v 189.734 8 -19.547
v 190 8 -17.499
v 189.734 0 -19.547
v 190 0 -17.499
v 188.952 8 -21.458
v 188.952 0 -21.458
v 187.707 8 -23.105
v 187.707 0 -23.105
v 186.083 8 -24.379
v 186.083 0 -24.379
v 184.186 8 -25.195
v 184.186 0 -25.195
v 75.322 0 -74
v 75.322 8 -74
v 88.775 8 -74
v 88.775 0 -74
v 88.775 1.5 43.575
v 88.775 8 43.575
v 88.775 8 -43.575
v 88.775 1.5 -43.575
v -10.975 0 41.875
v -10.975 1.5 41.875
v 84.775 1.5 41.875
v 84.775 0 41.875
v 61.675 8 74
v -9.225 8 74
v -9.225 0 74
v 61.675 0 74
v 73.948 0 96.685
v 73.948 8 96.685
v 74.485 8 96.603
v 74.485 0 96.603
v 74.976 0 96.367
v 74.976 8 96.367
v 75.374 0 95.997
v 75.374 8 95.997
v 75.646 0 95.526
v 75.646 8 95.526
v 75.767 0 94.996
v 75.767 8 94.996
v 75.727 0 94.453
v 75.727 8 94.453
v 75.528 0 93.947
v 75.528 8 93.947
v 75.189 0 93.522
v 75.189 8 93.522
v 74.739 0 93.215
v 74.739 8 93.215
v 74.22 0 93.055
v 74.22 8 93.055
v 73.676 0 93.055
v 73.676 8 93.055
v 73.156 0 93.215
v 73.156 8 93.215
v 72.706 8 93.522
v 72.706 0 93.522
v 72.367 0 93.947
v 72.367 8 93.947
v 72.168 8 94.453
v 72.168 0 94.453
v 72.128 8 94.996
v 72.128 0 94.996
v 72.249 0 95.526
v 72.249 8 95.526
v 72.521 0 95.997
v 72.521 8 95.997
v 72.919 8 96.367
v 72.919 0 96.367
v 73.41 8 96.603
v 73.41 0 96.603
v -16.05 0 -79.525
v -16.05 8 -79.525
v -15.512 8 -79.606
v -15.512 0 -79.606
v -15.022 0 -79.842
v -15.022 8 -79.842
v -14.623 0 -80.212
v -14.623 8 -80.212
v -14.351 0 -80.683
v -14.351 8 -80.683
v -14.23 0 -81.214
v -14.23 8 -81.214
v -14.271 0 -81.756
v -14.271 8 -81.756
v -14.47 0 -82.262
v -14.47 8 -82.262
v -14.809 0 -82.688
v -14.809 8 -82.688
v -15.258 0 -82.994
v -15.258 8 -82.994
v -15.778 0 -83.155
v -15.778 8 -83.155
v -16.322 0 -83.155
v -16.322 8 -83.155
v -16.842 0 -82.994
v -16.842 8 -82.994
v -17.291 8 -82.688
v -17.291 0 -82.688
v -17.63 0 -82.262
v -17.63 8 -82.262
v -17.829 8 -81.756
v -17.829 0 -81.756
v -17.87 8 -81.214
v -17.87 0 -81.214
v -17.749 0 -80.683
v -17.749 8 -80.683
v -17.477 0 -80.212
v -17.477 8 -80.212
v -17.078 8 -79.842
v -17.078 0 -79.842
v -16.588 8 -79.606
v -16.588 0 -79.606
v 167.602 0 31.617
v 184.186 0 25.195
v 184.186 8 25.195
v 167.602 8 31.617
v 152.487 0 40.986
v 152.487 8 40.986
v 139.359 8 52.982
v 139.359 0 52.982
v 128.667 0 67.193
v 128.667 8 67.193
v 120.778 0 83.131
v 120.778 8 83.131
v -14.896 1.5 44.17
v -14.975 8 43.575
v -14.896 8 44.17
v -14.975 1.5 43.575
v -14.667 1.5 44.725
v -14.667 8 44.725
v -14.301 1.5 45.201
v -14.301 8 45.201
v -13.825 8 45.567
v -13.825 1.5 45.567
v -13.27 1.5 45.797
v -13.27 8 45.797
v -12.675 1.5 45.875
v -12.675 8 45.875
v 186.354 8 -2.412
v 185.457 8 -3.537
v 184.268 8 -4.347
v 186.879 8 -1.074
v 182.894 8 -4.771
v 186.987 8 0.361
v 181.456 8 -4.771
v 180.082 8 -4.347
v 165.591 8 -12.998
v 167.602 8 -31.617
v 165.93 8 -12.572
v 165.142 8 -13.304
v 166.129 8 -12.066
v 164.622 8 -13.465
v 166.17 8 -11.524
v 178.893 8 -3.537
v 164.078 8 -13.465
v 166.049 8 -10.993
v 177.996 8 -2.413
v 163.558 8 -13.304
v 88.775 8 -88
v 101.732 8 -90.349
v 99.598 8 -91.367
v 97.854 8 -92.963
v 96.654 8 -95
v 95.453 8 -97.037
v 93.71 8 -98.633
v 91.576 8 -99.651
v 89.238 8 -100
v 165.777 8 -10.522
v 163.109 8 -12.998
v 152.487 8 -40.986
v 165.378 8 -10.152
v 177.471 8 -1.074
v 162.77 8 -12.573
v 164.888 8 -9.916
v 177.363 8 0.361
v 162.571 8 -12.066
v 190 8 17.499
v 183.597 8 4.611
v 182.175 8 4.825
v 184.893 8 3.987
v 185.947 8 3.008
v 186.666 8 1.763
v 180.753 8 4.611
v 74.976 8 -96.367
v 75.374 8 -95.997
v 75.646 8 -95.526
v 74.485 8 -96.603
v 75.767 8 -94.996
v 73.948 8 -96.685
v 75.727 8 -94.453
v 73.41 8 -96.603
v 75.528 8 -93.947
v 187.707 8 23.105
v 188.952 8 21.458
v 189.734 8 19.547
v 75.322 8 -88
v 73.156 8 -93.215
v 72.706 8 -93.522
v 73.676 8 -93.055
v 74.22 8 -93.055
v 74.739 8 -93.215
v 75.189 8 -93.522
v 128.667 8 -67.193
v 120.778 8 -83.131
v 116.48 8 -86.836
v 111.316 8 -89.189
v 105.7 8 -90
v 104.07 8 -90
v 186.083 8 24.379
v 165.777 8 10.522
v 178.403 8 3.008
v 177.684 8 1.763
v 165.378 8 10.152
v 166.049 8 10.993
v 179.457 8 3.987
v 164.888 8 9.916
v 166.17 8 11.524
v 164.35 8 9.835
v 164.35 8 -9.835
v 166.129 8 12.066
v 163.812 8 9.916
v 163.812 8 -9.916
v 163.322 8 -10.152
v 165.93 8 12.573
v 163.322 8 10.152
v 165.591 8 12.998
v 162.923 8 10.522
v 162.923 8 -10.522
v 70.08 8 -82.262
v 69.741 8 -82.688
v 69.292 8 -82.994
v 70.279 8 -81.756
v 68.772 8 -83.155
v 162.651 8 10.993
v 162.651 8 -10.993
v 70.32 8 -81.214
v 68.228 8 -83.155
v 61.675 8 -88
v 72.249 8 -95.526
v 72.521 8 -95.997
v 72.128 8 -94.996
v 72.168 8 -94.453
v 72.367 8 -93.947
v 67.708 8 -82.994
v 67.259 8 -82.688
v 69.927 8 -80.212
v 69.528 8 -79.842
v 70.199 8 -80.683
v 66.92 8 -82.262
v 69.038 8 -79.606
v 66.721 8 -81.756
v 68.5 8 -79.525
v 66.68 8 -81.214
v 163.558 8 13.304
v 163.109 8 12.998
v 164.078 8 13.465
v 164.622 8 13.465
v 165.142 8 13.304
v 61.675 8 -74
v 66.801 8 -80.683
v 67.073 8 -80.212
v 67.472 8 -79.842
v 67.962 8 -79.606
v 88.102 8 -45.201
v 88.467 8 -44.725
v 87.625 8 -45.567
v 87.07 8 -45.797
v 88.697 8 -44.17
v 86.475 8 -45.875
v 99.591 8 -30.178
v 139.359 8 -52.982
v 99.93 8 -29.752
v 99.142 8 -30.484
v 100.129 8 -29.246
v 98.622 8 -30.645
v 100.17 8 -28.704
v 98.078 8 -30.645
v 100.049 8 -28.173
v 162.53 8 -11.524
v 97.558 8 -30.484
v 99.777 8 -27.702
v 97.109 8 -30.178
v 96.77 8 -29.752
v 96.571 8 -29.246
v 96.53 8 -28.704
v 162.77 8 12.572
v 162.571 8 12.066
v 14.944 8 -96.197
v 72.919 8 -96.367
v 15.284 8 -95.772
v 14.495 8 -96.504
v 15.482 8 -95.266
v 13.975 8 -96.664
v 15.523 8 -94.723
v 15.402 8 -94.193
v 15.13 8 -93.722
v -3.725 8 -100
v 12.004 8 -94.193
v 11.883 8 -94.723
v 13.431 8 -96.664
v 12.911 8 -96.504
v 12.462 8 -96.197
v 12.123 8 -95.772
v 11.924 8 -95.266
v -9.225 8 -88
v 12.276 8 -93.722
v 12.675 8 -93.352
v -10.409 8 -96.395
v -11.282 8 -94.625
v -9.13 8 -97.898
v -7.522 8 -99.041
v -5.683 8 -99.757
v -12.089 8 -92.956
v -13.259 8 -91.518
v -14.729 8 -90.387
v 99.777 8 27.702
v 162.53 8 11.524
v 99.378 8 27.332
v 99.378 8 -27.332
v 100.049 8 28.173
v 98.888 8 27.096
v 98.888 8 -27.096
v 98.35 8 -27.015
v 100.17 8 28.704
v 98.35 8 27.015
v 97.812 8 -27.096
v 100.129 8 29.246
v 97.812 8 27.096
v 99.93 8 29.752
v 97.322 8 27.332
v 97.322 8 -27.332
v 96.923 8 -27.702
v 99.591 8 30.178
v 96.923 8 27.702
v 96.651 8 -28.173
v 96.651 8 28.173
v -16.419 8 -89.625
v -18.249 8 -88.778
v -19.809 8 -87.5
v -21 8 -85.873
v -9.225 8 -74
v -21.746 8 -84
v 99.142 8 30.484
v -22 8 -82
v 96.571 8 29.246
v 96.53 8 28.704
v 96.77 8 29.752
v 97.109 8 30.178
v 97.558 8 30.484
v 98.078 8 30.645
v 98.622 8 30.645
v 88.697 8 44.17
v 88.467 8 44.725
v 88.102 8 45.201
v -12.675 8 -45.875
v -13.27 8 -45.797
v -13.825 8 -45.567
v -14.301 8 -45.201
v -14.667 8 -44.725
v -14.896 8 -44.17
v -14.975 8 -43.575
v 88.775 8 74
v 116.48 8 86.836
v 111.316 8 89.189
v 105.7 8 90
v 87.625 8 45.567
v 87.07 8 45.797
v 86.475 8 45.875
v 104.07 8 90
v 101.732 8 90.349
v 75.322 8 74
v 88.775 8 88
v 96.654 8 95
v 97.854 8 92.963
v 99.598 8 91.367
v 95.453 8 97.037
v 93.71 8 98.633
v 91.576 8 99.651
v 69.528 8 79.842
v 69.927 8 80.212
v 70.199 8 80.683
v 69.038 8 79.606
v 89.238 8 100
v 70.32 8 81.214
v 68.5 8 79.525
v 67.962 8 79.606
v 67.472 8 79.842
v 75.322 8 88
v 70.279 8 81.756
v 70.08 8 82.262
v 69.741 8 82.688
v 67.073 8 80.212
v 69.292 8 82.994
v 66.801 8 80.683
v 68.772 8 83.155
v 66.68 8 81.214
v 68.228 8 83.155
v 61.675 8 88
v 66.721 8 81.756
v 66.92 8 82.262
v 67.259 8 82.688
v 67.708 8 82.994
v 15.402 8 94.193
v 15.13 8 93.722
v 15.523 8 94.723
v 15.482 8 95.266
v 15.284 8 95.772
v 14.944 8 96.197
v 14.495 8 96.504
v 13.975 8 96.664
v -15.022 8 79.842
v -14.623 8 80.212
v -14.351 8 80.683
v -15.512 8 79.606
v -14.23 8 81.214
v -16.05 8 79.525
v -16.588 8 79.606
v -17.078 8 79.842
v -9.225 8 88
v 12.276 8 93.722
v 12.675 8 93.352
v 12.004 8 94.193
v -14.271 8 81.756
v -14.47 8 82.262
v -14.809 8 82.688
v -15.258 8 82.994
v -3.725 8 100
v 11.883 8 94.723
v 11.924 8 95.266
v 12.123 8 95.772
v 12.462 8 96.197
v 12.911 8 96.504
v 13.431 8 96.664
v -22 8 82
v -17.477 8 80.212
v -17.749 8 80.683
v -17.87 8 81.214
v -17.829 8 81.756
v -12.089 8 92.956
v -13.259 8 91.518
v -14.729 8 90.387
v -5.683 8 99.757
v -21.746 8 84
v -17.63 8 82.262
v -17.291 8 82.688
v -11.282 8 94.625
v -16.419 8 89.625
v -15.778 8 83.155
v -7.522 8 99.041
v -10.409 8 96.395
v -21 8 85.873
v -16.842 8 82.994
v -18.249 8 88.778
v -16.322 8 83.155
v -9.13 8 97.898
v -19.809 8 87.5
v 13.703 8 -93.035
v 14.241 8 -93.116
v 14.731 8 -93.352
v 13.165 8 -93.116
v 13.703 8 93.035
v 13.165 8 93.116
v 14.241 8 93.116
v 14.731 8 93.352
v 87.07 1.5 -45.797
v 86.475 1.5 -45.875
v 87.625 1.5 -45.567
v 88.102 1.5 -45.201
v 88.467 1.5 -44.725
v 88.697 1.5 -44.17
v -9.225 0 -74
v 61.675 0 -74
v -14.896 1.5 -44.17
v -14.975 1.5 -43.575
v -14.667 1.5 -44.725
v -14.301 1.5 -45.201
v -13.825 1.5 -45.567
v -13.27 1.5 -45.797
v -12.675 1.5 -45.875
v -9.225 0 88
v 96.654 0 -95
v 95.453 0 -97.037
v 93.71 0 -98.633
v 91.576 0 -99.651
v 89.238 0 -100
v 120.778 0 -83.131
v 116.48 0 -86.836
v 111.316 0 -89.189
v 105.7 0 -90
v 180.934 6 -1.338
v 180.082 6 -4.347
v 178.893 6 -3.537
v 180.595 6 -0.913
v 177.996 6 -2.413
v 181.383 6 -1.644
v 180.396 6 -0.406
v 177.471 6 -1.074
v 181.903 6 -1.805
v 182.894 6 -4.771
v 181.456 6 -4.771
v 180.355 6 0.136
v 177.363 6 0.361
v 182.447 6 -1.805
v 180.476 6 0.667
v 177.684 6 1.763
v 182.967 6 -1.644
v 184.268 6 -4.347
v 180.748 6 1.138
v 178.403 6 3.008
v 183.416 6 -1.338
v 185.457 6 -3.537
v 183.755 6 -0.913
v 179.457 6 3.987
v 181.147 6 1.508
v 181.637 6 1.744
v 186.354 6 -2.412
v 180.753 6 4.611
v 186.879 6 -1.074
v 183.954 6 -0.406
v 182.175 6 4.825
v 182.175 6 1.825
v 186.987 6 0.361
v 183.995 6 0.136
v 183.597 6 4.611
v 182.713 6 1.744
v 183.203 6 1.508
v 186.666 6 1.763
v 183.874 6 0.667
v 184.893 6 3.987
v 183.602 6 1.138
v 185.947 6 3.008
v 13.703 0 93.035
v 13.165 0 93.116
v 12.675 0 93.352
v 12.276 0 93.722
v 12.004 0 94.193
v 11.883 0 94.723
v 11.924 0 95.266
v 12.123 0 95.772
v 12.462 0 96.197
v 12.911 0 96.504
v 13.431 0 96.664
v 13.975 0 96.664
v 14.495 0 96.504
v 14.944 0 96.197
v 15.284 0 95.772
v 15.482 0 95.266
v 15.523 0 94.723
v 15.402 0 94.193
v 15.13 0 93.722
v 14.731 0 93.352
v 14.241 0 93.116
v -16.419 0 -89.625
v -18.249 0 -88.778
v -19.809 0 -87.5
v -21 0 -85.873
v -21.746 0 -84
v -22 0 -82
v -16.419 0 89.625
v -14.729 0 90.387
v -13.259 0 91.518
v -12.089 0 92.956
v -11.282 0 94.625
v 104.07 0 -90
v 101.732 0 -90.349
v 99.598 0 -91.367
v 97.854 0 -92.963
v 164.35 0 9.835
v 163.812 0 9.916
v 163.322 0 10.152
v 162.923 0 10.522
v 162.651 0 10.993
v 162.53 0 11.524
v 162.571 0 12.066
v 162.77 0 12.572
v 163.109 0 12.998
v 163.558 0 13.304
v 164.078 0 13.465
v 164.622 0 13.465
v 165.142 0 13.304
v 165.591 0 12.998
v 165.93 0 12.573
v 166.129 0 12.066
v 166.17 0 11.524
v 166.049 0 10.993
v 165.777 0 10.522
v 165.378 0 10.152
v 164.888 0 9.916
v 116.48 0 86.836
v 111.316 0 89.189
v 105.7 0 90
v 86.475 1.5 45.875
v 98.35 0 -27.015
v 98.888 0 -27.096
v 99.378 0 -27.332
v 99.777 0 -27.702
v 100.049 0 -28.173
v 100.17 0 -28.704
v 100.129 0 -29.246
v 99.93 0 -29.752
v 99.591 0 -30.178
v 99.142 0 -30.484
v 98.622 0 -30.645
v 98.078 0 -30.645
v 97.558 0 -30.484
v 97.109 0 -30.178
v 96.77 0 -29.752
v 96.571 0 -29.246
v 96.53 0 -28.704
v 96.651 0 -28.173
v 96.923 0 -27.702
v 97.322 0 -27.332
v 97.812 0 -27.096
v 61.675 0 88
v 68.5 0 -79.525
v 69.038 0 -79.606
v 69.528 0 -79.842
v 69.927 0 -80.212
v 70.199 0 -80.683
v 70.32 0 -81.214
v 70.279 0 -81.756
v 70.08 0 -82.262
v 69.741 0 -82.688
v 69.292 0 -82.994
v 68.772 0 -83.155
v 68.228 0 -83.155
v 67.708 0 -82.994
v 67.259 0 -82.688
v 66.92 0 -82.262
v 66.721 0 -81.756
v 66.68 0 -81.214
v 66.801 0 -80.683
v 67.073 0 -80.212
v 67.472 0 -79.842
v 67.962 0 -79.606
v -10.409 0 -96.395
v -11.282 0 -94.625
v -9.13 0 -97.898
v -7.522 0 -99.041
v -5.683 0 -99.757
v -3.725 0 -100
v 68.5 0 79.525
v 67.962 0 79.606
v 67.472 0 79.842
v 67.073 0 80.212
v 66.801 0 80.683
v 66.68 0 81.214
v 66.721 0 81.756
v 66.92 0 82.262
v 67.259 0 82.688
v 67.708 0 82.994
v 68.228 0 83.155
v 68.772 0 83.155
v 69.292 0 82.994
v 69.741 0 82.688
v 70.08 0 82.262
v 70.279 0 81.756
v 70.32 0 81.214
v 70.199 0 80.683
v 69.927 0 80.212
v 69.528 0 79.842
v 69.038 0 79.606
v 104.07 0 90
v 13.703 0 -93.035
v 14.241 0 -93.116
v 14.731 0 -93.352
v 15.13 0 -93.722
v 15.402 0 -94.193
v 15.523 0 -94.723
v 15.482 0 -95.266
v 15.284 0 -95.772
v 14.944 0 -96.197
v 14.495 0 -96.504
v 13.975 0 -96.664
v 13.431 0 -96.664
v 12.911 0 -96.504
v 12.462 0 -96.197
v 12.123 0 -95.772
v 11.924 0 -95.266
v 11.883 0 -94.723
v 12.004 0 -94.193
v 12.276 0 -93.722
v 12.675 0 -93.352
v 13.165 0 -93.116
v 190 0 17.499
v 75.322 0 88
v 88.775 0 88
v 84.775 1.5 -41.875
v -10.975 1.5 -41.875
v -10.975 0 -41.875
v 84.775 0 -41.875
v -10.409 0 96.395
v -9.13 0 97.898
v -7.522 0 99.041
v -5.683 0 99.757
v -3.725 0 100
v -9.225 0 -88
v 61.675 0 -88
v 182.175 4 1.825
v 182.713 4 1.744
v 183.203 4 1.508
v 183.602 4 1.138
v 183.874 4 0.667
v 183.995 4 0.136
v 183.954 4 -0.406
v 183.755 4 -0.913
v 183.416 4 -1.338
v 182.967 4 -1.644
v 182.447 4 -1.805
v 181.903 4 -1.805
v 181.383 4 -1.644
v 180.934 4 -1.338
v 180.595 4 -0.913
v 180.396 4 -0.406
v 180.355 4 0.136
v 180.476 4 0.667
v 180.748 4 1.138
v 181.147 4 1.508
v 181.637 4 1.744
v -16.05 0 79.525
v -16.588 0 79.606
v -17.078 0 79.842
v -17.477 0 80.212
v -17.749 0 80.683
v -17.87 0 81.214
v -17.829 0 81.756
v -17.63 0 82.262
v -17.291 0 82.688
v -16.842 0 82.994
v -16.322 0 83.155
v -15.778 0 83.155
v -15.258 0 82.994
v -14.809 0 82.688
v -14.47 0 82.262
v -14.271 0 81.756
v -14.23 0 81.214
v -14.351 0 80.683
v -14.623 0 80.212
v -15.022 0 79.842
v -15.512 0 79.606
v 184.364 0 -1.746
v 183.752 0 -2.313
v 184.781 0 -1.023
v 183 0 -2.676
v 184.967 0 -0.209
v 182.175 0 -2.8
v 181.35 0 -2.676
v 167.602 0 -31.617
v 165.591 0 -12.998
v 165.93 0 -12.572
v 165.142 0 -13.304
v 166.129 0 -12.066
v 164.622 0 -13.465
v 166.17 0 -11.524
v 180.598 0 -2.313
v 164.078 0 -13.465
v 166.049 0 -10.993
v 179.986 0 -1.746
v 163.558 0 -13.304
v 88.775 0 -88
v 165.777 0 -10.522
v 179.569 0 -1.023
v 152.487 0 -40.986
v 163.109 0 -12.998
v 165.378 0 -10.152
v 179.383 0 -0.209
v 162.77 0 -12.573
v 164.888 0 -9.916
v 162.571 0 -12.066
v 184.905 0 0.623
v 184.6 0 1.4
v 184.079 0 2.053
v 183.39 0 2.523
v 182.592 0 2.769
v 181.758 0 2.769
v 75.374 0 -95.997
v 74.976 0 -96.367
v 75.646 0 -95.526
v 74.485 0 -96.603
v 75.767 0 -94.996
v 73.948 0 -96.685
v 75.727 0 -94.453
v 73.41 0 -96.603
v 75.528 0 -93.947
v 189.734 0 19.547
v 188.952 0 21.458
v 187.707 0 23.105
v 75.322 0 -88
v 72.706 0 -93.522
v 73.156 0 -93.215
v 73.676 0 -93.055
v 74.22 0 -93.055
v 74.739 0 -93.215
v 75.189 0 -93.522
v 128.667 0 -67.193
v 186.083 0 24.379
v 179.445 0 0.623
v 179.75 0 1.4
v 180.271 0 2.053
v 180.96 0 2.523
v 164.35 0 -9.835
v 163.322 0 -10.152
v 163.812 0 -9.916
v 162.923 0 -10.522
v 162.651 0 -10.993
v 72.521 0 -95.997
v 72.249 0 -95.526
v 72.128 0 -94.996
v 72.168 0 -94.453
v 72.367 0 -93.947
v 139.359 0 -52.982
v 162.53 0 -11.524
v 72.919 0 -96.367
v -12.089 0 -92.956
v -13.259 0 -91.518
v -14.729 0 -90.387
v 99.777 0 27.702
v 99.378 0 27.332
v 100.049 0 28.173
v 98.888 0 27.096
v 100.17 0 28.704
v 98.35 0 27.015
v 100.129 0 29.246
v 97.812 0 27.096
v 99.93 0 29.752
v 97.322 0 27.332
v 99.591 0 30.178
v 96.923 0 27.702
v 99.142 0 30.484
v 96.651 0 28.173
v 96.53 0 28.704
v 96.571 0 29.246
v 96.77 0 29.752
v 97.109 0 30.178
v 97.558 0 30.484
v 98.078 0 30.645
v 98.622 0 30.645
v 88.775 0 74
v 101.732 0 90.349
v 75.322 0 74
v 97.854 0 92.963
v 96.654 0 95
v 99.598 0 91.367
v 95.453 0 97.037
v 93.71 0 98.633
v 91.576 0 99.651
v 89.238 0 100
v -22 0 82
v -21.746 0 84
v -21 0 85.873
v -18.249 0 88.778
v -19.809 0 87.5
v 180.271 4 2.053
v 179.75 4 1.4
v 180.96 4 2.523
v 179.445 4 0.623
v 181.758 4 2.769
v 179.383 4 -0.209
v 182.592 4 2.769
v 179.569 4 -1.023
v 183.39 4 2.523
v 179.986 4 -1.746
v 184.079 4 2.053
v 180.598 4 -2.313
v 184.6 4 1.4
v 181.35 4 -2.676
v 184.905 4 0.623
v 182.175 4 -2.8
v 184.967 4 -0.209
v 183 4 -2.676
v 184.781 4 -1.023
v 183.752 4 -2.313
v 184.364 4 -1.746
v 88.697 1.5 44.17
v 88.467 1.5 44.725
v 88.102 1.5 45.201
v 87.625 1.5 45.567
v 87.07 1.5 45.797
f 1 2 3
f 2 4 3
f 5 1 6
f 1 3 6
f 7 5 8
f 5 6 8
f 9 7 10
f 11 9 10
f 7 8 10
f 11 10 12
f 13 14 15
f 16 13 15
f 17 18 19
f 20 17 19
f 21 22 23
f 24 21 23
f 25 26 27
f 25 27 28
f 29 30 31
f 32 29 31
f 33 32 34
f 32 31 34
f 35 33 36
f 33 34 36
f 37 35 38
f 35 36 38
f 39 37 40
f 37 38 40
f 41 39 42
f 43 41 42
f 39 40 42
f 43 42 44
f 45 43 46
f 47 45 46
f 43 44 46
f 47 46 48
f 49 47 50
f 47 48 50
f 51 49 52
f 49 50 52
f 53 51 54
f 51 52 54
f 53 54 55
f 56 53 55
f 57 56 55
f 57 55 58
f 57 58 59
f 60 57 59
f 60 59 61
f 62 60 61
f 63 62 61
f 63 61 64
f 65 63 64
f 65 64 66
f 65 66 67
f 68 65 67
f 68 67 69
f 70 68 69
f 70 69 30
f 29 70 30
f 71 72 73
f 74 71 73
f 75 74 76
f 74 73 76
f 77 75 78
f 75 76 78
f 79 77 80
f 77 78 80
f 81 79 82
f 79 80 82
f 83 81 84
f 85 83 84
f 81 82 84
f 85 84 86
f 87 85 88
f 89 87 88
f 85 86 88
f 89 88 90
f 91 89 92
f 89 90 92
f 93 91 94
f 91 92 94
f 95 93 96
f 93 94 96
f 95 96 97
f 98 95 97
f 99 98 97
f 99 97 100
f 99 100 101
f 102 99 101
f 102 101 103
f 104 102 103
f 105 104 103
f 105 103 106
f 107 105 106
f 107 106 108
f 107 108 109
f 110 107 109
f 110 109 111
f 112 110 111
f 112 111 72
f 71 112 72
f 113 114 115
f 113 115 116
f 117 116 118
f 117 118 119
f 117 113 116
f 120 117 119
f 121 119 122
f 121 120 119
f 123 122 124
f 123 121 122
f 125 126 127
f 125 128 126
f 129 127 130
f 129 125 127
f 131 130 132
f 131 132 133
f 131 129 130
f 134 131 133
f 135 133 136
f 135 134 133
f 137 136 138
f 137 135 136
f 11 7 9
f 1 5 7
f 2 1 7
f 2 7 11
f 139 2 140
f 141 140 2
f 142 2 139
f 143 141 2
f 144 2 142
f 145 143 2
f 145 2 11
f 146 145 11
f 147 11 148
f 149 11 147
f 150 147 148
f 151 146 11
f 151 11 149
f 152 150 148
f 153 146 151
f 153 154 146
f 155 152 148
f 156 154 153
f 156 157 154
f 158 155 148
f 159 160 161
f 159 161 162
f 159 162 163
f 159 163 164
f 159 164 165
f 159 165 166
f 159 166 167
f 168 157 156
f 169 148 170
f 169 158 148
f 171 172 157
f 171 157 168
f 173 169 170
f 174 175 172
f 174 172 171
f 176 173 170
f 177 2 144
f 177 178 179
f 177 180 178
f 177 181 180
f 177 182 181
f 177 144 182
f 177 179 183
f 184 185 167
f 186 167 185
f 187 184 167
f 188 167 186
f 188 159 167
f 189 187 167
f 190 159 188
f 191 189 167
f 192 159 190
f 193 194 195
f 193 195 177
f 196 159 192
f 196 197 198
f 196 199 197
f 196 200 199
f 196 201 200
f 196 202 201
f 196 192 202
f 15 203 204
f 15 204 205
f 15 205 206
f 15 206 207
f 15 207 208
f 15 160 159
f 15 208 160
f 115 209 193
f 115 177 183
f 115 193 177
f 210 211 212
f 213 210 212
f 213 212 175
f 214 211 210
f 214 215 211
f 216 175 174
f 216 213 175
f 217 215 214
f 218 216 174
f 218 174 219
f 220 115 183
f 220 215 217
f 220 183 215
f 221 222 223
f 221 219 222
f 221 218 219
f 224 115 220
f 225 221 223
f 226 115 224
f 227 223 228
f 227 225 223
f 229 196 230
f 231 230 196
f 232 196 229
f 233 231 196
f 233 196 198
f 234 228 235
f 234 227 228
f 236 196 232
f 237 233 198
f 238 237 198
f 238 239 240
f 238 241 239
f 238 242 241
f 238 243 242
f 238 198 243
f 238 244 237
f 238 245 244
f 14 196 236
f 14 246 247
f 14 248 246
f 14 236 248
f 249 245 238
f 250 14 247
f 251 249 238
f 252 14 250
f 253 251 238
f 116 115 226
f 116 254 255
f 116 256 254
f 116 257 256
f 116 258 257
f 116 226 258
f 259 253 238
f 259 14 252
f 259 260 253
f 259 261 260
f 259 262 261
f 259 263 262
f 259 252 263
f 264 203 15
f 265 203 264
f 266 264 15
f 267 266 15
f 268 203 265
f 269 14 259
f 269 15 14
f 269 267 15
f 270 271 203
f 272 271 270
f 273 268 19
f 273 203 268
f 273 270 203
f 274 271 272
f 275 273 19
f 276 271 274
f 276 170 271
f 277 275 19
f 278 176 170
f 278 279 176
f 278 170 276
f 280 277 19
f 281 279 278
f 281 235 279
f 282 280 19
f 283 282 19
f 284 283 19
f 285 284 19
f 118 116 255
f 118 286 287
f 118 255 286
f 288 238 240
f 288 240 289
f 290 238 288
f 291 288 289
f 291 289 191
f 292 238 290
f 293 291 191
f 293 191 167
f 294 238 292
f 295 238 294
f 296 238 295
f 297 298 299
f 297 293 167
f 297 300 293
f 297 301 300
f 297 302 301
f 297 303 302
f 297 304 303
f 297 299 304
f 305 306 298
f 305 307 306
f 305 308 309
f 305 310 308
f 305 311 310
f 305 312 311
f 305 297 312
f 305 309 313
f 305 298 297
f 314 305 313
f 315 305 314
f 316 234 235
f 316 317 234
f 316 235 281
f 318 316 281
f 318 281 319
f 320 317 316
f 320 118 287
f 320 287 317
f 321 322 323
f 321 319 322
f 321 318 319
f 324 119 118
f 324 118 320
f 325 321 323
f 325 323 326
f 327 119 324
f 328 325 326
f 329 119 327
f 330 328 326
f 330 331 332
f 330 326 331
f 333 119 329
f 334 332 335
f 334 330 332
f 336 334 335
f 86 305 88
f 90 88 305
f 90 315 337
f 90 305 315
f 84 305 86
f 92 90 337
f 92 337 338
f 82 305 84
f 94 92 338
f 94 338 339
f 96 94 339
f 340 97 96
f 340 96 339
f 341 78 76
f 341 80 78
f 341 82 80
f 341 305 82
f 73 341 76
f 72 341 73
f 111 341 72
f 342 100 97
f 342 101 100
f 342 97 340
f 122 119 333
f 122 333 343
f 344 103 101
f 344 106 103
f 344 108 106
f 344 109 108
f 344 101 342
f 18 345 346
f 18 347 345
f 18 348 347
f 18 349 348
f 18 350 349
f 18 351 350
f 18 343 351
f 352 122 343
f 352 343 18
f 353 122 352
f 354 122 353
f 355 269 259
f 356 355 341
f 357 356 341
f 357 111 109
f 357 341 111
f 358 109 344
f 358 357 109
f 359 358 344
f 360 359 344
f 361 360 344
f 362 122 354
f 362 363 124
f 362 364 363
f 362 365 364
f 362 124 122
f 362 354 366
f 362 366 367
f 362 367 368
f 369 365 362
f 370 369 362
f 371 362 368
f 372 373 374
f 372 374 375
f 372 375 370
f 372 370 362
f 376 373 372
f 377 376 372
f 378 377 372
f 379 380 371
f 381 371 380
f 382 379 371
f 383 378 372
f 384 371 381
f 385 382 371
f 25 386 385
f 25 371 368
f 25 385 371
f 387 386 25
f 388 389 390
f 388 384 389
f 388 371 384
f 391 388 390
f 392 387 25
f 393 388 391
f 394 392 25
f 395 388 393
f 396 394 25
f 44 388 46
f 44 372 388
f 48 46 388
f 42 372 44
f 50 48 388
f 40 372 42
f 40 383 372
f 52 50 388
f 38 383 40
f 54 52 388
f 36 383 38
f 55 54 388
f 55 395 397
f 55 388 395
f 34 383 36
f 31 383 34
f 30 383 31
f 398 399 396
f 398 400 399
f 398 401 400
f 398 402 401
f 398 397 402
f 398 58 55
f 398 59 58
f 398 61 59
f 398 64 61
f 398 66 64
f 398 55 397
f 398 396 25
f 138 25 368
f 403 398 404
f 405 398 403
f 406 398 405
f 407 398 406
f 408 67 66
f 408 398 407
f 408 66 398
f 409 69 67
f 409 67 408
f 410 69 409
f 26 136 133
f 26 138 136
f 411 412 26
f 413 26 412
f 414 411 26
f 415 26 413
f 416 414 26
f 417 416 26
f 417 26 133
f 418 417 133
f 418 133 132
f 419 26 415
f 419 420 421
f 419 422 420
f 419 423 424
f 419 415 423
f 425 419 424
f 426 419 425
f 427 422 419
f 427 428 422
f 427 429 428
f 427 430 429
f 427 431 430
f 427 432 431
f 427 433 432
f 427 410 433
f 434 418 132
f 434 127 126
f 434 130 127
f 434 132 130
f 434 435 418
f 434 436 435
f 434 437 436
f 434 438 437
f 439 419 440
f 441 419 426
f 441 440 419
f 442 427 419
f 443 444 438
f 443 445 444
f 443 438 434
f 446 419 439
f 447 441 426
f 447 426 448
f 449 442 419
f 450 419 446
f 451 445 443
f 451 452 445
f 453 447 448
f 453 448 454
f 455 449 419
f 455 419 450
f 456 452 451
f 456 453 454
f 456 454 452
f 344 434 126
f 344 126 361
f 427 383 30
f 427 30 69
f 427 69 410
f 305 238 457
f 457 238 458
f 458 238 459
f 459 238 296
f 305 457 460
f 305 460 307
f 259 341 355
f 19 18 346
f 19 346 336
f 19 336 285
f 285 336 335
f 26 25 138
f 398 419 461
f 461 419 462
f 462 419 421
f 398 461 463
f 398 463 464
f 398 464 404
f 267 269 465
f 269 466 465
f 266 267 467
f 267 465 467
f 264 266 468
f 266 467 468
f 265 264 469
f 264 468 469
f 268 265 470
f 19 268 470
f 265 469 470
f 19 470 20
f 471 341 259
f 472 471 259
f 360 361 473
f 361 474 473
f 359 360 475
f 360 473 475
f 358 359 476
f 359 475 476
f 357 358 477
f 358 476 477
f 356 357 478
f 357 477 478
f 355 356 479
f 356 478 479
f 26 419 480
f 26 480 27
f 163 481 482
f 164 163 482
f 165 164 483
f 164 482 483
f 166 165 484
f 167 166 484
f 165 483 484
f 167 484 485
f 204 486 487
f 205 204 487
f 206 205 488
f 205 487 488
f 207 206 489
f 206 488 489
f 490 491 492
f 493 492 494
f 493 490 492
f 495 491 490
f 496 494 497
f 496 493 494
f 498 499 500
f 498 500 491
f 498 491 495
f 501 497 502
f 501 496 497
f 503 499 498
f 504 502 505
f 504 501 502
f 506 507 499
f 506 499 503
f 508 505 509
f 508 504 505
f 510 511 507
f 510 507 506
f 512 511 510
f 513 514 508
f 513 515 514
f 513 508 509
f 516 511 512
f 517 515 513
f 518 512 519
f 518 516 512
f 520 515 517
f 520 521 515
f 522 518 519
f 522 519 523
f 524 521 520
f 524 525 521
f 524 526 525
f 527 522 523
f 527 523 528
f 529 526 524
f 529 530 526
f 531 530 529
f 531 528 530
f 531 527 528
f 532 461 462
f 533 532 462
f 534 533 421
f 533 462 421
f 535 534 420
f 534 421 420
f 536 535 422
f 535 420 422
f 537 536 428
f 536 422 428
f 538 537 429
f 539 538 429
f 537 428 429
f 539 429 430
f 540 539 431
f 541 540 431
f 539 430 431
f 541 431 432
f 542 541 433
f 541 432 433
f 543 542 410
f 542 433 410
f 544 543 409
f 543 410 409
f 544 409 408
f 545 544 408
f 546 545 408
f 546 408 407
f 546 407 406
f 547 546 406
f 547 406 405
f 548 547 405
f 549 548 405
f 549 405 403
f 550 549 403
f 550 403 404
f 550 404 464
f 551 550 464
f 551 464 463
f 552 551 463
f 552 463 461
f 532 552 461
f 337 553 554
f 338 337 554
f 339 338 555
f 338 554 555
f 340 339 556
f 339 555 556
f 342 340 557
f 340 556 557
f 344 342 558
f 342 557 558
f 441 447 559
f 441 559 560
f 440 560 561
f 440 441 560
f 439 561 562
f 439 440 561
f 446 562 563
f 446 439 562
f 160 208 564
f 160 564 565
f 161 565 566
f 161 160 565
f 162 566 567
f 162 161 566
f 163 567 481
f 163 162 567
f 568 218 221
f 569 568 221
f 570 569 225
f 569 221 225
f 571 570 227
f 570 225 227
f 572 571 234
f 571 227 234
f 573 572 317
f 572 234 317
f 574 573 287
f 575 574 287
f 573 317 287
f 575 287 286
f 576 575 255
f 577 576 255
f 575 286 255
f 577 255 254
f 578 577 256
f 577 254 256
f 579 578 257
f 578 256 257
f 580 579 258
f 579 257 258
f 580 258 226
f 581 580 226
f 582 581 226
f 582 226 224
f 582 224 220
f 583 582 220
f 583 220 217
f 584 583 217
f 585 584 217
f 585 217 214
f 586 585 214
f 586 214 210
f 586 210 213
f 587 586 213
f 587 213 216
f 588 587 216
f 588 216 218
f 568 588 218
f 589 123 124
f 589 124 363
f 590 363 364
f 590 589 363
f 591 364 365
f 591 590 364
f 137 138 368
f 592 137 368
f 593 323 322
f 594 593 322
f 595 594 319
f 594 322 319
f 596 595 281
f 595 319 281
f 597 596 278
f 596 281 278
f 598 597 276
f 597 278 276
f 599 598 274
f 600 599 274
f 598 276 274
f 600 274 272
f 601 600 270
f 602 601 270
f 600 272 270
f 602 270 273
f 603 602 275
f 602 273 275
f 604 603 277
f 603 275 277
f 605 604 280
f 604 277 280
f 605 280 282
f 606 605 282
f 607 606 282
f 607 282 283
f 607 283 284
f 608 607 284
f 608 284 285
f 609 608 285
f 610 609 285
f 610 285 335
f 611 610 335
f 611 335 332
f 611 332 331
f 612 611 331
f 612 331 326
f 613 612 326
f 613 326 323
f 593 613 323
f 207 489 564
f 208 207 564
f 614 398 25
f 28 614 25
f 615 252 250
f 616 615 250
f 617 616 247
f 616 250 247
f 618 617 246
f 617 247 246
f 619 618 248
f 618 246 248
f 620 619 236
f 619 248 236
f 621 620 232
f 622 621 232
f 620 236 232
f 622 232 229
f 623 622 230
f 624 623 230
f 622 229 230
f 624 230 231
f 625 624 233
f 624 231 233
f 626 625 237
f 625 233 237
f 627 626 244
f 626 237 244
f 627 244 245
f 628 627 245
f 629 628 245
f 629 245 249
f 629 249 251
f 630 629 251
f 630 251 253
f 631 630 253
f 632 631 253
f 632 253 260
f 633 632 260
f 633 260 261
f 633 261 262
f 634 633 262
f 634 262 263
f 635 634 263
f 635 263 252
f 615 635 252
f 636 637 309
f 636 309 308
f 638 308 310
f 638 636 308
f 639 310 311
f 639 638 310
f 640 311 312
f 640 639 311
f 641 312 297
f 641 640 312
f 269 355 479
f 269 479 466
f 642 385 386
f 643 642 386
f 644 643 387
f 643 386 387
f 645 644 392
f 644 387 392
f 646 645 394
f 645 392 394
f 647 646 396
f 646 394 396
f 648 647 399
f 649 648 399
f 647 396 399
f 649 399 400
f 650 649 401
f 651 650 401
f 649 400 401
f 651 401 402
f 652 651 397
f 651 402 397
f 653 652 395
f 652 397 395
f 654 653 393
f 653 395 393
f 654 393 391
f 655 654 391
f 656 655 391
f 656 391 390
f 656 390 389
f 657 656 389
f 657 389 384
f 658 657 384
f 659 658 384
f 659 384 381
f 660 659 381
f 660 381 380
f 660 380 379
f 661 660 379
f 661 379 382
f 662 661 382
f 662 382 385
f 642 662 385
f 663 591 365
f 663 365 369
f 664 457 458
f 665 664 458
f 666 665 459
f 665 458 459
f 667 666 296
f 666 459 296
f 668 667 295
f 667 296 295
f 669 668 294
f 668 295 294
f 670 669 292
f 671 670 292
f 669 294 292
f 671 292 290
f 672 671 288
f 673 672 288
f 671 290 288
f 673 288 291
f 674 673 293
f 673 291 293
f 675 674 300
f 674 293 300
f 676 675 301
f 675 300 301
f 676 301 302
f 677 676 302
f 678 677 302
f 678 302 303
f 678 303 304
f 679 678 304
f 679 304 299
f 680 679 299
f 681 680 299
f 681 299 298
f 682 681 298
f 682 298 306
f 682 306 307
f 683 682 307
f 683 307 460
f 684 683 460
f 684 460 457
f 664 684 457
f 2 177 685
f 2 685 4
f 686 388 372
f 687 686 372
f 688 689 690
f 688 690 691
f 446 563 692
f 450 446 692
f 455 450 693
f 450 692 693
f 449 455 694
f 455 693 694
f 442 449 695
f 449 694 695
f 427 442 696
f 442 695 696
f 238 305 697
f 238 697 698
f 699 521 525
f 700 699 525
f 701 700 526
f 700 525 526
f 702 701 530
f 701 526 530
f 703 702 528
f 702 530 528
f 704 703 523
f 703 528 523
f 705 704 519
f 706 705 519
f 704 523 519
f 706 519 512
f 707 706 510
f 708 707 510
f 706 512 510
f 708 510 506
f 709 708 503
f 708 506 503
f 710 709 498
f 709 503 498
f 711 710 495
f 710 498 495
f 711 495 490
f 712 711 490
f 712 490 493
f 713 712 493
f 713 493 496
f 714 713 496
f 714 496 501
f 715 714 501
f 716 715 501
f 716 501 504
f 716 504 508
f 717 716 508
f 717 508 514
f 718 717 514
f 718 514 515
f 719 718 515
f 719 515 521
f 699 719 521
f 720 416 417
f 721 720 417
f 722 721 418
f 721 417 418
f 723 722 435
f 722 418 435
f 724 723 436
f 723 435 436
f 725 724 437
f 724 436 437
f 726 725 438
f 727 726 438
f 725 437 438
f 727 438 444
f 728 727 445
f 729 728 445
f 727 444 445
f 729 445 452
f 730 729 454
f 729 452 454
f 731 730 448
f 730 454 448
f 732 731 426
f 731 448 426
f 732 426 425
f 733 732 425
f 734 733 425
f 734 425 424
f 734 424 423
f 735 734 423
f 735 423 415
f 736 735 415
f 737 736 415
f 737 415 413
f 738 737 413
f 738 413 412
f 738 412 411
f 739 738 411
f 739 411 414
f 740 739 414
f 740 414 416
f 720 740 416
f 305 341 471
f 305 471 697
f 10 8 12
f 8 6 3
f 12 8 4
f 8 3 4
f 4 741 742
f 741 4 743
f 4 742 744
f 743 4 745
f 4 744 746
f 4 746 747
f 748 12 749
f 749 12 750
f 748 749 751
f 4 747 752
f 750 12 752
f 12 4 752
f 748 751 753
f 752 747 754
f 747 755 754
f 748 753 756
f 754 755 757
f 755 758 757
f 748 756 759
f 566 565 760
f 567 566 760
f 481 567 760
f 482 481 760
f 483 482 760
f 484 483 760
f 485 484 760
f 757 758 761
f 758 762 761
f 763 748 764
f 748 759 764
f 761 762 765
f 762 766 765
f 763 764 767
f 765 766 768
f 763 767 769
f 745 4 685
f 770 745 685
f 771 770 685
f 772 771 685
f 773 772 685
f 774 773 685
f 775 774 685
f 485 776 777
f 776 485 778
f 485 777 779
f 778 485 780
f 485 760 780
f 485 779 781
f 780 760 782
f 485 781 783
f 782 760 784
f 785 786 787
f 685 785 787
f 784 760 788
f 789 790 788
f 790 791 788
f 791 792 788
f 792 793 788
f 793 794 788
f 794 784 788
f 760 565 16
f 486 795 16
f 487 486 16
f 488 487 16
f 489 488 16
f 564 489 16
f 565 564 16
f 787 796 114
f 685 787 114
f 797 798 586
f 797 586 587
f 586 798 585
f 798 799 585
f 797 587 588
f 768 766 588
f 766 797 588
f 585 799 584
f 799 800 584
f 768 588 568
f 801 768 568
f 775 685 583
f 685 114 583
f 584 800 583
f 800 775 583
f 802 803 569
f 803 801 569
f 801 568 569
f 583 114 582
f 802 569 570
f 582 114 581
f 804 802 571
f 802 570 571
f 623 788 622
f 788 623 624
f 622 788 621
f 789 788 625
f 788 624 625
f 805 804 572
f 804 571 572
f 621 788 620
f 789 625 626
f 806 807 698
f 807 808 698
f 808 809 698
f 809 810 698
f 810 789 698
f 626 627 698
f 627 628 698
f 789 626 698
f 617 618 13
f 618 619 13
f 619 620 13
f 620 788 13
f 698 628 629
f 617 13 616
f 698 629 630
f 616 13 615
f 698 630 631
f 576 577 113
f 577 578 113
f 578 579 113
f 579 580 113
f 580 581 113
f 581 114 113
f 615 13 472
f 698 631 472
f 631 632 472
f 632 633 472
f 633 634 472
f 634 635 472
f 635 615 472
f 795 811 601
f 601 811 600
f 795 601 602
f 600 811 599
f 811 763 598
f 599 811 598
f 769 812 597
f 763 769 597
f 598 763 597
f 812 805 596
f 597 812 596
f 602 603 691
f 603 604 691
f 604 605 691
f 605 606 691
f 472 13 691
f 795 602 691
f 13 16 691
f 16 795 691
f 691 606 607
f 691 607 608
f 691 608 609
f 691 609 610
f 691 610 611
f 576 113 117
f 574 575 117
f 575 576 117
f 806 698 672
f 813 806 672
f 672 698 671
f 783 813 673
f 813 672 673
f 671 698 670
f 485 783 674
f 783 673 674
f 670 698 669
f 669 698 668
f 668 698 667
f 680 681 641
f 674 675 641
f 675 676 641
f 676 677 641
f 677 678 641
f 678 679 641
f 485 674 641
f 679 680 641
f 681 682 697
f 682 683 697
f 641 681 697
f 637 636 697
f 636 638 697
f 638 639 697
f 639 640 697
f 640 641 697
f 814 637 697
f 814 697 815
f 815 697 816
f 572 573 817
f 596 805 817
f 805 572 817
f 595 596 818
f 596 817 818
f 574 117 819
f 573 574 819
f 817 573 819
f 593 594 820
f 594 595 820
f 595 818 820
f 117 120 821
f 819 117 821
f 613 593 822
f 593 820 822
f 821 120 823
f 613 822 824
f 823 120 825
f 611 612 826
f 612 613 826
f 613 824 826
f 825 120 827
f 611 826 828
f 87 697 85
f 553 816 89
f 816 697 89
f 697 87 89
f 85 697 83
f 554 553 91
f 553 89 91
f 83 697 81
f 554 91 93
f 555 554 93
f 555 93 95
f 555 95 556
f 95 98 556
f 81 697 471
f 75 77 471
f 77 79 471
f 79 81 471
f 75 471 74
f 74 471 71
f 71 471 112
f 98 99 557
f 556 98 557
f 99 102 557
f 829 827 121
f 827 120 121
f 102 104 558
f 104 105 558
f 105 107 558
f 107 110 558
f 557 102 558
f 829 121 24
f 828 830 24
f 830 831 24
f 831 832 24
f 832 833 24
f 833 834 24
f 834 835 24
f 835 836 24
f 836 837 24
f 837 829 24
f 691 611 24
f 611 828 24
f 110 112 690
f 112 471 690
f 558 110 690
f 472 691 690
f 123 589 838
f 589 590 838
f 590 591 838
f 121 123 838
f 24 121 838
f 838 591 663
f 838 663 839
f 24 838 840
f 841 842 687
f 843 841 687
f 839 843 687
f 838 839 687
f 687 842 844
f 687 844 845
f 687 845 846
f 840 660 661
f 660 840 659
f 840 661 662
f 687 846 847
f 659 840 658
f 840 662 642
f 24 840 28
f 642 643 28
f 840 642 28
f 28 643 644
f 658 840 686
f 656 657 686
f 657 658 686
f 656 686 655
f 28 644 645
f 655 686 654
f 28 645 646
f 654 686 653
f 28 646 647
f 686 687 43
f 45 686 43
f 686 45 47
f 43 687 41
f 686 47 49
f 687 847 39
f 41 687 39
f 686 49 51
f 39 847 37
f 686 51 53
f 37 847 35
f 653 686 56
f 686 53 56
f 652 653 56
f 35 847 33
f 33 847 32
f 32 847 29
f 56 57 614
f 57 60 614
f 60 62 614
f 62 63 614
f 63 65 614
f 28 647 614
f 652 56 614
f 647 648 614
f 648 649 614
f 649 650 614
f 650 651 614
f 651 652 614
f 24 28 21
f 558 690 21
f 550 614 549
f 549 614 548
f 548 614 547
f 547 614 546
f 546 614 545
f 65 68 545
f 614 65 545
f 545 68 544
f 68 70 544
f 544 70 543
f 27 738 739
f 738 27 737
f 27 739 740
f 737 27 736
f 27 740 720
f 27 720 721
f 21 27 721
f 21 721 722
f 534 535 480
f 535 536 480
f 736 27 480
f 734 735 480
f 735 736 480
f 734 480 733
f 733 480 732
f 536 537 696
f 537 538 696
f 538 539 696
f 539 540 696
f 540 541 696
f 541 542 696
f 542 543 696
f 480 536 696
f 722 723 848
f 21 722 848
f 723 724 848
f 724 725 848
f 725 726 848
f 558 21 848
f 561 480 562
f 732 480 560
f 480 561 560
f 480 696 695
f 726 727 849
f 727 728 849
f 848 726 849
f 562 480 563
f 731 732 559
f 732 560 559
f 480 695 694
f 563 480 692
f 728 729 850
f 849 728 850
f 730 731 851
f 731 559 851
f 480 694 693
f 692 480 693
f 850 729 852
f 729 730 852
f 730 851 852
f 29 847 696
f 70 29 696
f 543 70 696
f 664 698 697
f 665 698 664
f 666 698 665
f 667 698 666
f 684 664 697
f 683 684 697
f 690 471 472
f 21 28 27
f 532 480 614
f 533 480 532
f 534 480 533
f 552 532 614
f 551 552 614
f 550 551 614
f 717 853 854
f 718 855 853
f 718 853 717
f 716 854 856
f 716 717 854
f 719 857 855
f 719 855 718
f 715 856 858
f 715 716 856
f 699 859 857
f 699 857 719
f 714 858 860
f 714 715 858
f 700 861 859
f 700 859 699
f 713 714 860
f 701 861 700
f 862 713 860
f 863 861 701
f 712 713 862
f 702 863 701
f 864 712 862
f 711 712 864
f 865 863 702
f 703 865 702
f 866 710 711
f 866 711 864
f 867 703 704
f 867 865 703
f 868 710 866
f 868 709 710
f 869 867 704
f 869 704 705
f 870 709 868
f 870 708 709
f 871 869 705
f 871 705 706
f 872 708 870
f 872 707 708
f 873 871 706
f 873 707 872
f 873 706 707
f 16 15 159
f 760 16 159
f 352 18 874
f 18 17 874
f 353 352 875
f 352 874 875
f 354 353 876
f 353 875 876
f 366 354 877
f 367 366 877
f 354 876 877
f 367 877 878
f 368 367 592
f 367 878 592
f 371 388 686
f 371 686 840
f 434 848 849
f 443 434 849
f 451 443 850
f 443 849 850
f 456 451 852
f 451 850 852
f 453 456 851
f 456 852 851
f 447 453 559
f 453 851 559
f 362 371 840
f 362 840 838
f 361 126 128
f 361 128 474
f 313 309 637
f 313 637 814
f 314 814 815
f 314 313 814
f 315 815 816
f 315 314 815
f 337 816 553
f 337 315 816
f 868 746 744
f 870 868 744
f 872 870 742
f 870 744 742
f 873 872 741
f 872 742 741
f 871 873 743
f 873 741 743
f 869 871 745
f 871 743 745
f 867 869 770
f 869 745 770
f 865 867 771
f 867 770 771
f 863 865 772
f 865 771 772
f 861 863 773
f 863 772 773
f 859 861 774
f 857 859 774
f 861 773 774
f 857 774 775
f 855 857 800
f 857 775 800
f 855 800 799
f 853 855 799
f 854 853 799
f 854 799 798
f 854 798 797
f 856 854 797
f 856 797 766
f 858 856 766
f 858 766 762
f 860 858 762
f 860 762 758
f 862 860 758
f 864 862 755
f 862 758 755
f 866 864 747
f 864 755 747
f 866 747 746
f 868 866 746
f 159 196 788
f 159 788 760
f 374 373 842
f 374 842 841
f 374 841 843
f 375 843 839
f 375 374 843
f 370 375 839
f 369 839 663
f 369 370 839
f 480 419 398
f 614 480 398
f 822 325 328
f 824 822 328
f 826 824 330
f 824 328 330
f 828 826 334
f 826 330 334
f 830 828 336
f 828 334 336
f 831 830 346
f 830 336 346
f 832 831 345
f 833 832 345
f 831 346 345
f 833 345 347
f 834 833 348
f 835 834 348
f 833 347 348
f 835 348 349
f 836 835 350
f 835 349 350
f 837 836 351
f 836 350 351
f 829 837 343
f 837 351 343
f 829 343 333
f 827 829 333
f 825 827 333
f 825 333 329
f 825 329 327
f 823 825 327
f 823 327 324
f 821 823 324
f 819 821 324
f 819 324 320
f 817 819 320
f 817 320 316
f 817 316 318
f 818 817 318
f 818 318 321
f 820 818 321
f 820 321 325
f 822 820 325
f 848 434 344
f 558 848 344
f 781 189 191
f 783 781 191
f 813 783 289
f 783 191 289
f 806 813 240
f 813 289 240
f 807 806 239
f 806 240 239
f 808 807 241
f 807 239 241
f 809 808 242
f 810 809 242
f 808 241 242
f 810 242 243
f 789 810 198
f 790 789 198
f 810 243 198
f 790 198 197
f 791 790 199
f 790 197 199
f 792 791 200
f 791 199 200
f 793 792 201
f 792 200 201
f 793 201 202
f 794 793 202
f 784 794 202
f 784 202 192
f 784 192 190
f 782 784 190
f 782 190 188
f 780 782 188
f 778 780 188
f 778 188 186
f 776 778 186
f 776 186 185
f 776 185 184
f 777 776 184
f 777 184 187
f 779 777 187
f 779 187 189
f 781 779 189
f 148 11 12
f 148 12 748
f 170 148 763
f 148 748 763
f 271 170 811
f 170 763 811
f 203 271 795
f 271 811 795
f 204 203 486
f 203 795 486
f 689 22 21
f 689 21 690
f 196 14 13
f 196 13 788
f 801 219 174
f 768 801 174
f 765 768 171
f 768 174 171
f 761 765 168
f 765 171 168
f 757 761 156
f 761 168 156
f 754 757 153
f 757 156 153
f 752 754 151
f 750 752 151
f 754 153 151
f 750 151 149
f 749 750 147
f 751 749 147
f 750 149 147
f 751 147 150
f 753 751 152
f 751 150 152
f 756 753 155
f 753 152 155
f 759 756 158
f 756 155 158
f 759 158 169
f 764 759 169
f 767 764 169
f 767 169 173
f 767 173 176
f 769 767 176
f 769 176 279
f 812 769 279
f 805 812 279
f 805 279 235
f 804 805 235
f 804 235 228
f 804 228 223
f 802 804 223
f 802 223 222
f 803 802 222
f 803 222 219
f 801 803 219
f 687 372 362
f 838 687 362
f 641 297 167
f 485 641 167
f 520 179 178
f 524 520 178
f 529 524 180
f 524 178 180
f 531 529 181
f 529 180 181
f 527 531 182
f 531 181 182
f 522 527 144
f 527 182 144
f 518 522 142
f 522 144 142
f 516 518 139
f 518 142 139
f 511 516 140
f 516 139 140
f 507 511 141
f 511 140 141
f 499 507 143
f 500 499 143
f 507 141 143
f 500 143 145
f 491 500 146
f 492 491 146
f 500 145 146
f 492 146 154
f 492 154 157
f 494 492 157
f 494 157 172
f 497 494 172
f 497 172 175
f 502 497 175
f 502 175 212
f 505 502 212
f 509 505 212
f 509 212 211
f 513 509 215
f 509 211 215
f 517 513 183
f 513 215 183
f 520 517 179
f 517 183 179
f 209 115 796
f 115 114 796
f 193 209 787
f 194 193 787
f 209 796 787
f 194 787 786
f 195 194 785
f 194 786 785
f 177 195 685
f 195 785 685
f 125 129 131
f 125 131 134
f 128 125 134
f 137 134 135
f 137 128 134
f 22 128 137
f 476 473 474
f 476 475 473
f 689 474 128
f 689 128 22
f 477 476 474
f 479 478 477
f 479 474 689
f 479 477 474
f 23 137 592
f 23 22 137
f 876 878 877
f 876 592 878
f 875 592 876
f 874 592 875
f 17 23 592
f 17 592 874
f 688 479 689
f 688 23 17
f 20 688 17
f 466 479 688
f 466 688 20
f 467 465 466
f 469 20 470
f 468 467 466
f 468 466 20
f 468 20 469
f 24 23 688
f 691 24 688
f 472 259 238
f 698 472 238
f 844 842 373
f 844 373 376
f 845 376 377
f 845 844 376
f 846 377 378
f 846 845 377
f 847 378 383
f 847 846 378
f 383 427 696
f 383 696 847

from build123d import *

# Parameters (mm, degrees)
SALIENTE_EXTRUIR1_DEPTH = 8
CROQUIS2_R              = 1.825
CORTAR_EXTRUIR1_DEPTH   = 220.463870727
CROQUIS3_R              = 1.825
CORTAR_EXTRUIR2_DEPTH   = 220.463870727
CROQUIS4_W              = 103.75
CROQUIS4_H              = 91.75
CORTAR_EXTRUIR3_DEPTH   = 6.5
REDONDEO1_R             = 2.3
CROQUIS5_R              = 1.825
CORTAR_EXTRUIR4_DEPTH   = 220.463870727
CROQUIS20_W             = 70.9
CROQUIS20_H             = 14
CROQUIS20_W_2           = 13.452738683
CORTAR_EXTRUIR15_DEPTH  = 220.463870727
CROQUIS6_W              = 95.75
CROQUIS6_H              = 83.75
CORTAR_EXTRUIR5_DEPTH   = 220.414312556
CROQUIS9_R              = 1.825
CORTAR_EXTRUIR7_DEPTH   = 220.463870727
CROQUIS12_W             = 65
CROQUIS12_H             = 180
CORTAR_EXTRUIR9_DEPTH   = 220.463870727
REDONDEO2_R             = 8
CROQUIS14_R             = 1.825
CORTAR_EXTRUIR11_DEPTH  = 220.463870727
CROQUIS15_R             = 4.825
CORTAR_EXTRUIR12_DEPTH  = 2
CROQUIS16_W             = 11
CROQUIS16_H             = 47.47584408
CORTAR_EXTRUIR13_DEPTH  = 220.463870727
REDONDEO3_R             = 8
CROQUIS18_R             = 2.8
CORTAR_EXTRUIR14_DEPTH  = 4
CROQUIS21_W             = 108.962587205
CROQUIS21_H             = 10
SALIENTE_EXTRUIR9_DEPTH = 8
REDONDEO5_R             = 8
REDONDEO6_R             = 8
CROQUIS22_R             = 1.825
CORTAR_EXTRUIR16_DEPTH  = 215.858092703


with BuildPart() as part:
    # Croquis1 → Saliente-Extruir1 (new body)
    with BuildSketch(Plane(origin=(0, 0, 0), x_dir=(1, 0, 0), z_dir=(0, 1, 0))):
        with BuildLine():
            Line((0, 0), (200, 0))
            Line((200, 0), (200, 15.2))
            ThreePointArc((200, 15.2), (197.701163079, 20.938172036), (191.9990235, 23.3249845))
            ThreePointArc((191.9990235, 23.3249845), (148.666739026, 44.032184001), (120.7781513, 83.1307986))
            ThreePointArc((120.7781513, 83.1307986), (113.982057966, 88.196272982), (105.7, 90))
            Line((105.7, 90), (0, 90))
            Line((0, 90), (-79, 90))
            ThreePointArc((-79, 90), (-84.638146896, 87.675499941), (-86.999825594, 82.052824894))
            Line((-86.999825594, 82.052824894), (-86.999825594, 41.494023494))
            Line((-86.999825594, 41.494023494), (-86.999825594, 0))
            Line((-86.999825594, 0), (0, 0))
        make_face()
    extrude(amount=SALIENTE_EXTRUIR1_DEPTH)

    # Simetría2: part across plane


with BuildPart() as part_1:
    add(part.part)
    add(part.part.mirror(Plane(origin=(0, 8, 0), x_dir=(1, 0, 0), z_dir=(0, 0, -1))))

    # Croquis2 → Cortar-Extruir1 (cut, through all)
    with BuildSketch(Plane(origin=(0, 8, 0), x_dir=(1, 0, 0), z_dir=(0, 1, 0))):
        with Locations(Location((68.5, 81.35, 0), (0, 0, 270))):
            Circle(CROQUIS2_R)
        with Locations(Location((-16.05, 81.35, 0), (0, 0, 270))):
            Circle(CROQUIS2_R)
        with Locations(Location((68.5, -81.35, 0), (0, 0, 90))):
            Circle(CROQUIS2_R)
        with Locations(Location((-16.05, -81.35, 0), (0, 0, 90))):
            Circle(CROQUIS2_R)
    extrude(amount=-CORTAR_EXTRUIR1_DEPTH, mode=Mode.SUBTRACT)

    # Croquis3 → Cortar-Extruir2 (cut, through all)
    with BuildSketch(Plane(origin=(0, 8, 0), x_dir=(1, 0, 0), z_dir=(0, 1, 0))):
        with Locations(Location((-76.999825594, -46.75, 0), (0, 0, 270))):
            Circle(CROQUIS3_R)
        with Locations(Location((-34.999825594, -46.75, 0), (0, 0, 270))):
            Circle(CROQUIS3_R)
        with Locations(Location((-34.999825594, 46.75, 0), (0, 0, 90))):
            Circle(CROQUIS3_R)
        with Locations(Location((-76.999825594, 46.75, 0), (0, 0, 90))):
            Circle(CROQUIS3_R)
    extrude(amount=-CORTAR_EXTRUIR2_DEPTH, mode=Mode.SUBTRACT)

    # Croquis4 → Cortar-Extruir3 (cut)
    with BuildSketch(Plane(origin=(0, 8, 0), x_dir=(1, 0, 0), z_dir=(0, 1, 0))):
        with Locations((36.90017441, 0)):
            Rectangle(CROQUIS4_W, CROQUIS4_H)
    extrude(amount=-CORTAR_EXTRUIR3_DEPTH, mode=Mode.SUBTRACT)

    # Redondeo1
    redondeo1_edges = [part_1.edges().sort_by_distance(p)[0] for p in [
        (88.77517441, 4.75, -45.875),
        (88.77517441, 4.75, 45.875),
        (-14.97482559, 4.75, 45.875),
        (-14.97482559, 4.75, -45.875),
    ]]
    fillet(redondeo1_edges, radius=REDONDEO1_R)

    # Croquis5 → Cortar-Extruir4 (cut, through all)
    with BuildSketch(Plane(origin=(0, 8, 0), x_dir=(1, 0, 0), z_dir=(0, 1, 0))):
        with Locations(Location((98.35, 28.84, 0), (0, 0, 270))):
            Circle(CROQUIS5_R)
        with Locations(Location((98.35, -28.84, 0), (0, 0, 90))):
            Circle(CROQUIS5_R)
        with Locations(Location((164.35, 11.66, 0), (0, 0, 270))):
            Circle(CROQUIS5_R)
        with Locations(Location((164.35, -11.66, 0), (0, 0, 90))):
            Circle(CROQUIS5_R)
    extrude(amount=-CORTAR_EXTRUIR4_DEPTH, mode=Mode.SUBTRACT)

    # Croquis20 → Cortar-Extruir15 (cut, through all)
    with BuildSketch(Plane(origin=(0, 8, 0), x_dir=(1, 0, 0), z_dir=(0, 1, 0))):
        with Locations((26.225, -81)):
            Rectangle(CROQUIS20_W, CROQUIS20_H)
        with Locations((82.048805069, -81)):
            Rectangle(CROQUIS20_W_2, CROQUIS20_H)
        with Locations((82.048805069, 81)):
            Rectangle(CROQUIS20_W_2, CROQUIS20_H)
        with Locations((26.225, 81)):
            Rectangle(CROQUIS20_W, CROQUIS20_H)
    extrude(amount=-CORTAR_EXTRUIR15_DEPTH, mode=Mode.SUBTRACT)

    # Croquis6 → Cortar-Extruir5 (cut, through all)
    with BuildSketch(Plane(origin=(0, 1.5, 0), x_dir=(1, 0, 0), z_dir=(0, 1, 0))):
        with Locations((36.90017441, 0)):
            Rectangle(CROQUIS6_W, CROQUIS6_H)
    extrude(amount=-CORTAR_EXTRUIR5_DEPTH, mode=Mode.SUBTRACT)

    # Croquis9 → Cortar-Extruir7 (cut, through all)
    with BuildSketch(Plane(origin=(0, 8, 0), x_dir=(1, 0, 0), z_dir=(0, 1, 0))):
        with Locations(Location((-80.675393895, -75.767215538, 0), (0, 0, 270))):
            Circle(CROQUIS9_R)
        with Locations(Location((-58.52366486, -80.370640978, 0), (0, 0, 270))):
            Circle(CROQUIS9_R)
        with Locations(Location((-58.52366486, 80.370640978, 0), (0, 0, 90))):
            Circle(CROQUIS9_R)
        with Locations(Location((-80.675393895, 75.767215538, 0), (0, 0, 90))):
            Circle(CROQUIS9_R)
    extrude(amount=-CORTAR_EXTRUIR7_DEPTH, mode=Mode.SUBTRACT)

    # Croquis12 → Cortar-Extruir9 (cut, through all)
    with BuildSketch(Plane(origin=(0, 8, 0), x_dir=(1, 0, 0), z_dir=(0, 1, 0))):
        with Locations((-54.499825594, 0)):
            Rectangle(CROQUIS12_W, CROQUIS12_H)
    extrude(amount=-CORTAR_EXTRUIR9_DEPTH, mode=Mode.SUBTRACT)

    # Redondeo2
    redondeo2_edges = [part_1.edges().sort_by_distance(p)[0] for p in [
        (-21.999825594, 4, 90),
        (-21.999825594, 4, -90),
    ]]
    fillet(redondeo2_edges, radius=REDONDEO2_R)

    # Croquis14 → Cortar-Extruir11 (cut, through all)
    with BuildSketch(Plane(origin=(0, 8, 0), x_dir=(1, 0, 0), z_dir=(0, 1, 0))):
        with Locations(Location((182.175, 0, 0), (0, 0, 270))):
            Circle(CROQUIS14_R)
    extrude(amount=-CORTAR_EXTRUIR11_DEPTH, mode=Mode.SUBTRACT)

    # Croquis15 → Cortar-Extruir12 (cut)
    with BuildSketch(Plane(origin=(0, 8, 0), x_dir=(1, 0, 0), z_dir=(0, 1, 0))):
        with Locations(Location((182.175, 0, 0), (0, 0, 270))):
            Circle(CROQUIS15_R)
    extrude(amount=-CORTAR_EXTRUIR12_DEPTH, mode=Mode.SUBTRACT)

    # Croquis16 → Cortar-Extruir13 (cut, through all)
    with BuildSketch(Plane(origin=(0, 8, 0), x_dir=(1, 0, 0), z_dir=(0, 1, 0))):
        with Locations((195.5, 0)):
            Rectangle(CROQUIS16_W, CROQUIS16_H)
    extrude(amount=-CORTAR_EXTRUIR13_DEPTH, mode=Mode.SUBTRACT)

    # Redondeo3
    redondeo3_edges = [part_1.edges().sort_by_distance(p)[0] for p in [
        (190, 4, 23.73792204),
        (190, 4, -23.73792204),
    ]]
    fillet(redondeo3_edges, radius=REDONDEO3_R)

    # Croquis18 → Cortar-Extruir14 (cut)
    with BuildSketch(Plane.XZ):
        with Locations(Location((182.175, 0, 0), (0, 0, 270))):
            Circle(CROQUIS18_R)
    extrude(amount=-CORTAR_EXTRUIR14_DEPTH, mode=Mode.SUBTRACT)

    # Croquis21 → Saliente-Extruir9 (add)
    with BuildSketch(Plane(origin=(0, 8, 0), x_dir=(1, 0, 0), z_dir=(0, 1, 0))):
        with Locations((42.756293603, 95)):
            Rectangle(CROQUIS21_W, CROQUIS21_H)
        with Locations((42.756293603, -95)):
            Rectangle(CROQUIS21_W, CROQUIS21_H)
    extrude(amount=-SALIENTE_EXTRUIR9_DEPTH)

    # Redondeo5
    redondeo5_edges = [part_1.edges().sort_by_distance(p)[0] for p in [
        (-11.725, 4, -100),
        (97.237587205, 4, -100),
        (-11.725, 4, 100),
        (97.237587205, 4, 100),
    ]]
    fillet(redondeo5_edges, radius=REDONDEO5_R)

    # Redondeo6
    # the kernel refuses this fillet: 8 mm, written as the material it adds along each edge
    with BuildSketch(Plane(origin=(-11.725, 8, -90), x_dir=(0.09534974833302788, 0, -0.9954438334194594), z_dir=(0, -1, 0))) as redondeo6_piece_1:
        with BuildLine():
            CenterArc((6.539334701, -7.772851171), REDONDEO6_R, 103.686136853, 53.238021041)
            Line((-0.820560007, -4.637257147), (-1.556549478, -4.323697744))
            ThreePointArc((-1.556549478, -4.323697744), (-1.013259115, -2.188181311), (-0.796355067, 0.076279799))
            Line((-0.796355067, 0.076279799), (0.076279799, 0.796355067))
            ThreePointArc((0.076279799, 0.796355067), (2.067167466, 0.60565557), (4.457227725, 0.777285117))
            Line((4.457227725, 0.777285117), (4.646510177, 0))
        make_face()
    extrude(amount=8)
    with BuildSketch(Plane(origin=(97.237587205, 8, -90), x_dir=(-0.11597245427471743, 0, -0.9932524300748017), z_dir=(0, -1, 0))) as redondeo6_piece_2:
        with BuildLine():
            CenterArc((7.153649595, 7.714074532), REDONDEO6_R, 186.659717889, 67.975687163)
            Line((-0.792369846, 6.786294898), (-1.58697179, 6.693516934))
            Line((-1.58697179, 6.693516934), (-0.794601944, -0.092777963))
            Line((-0.794601944, -0.092777963), (0.092777963, -0.794601944))
            ThreePointArc((0.092777963, -0.794601944), (2.079282824, -0.562657036), (4.82199879, -0.771407453))
            Line((4.82199879, -0.771407453), (5.033967045, 0))
        make_face()
    extrude(amount=8)
    with BuildSketch(Plane(origin=(-11.725, 8, 90), x_dir=(-0.996830274314205, 0, -0.07955755281974515), z_dir=(0, -1, 0))) as redondeo6_piece_3:
        with BuildLine():
            CenterArc((6.514517354, -7.793662637), REDONDEO6_R, 103.04125749, 53.238021041)
            Line((-0.809619973, -4.575431382), (-1.542033706, -4.253608256))
            ThreePointArc((-1.542033706, -4.253608256), (-0.956579325, -1.930014506), (-0.797464219, 0.063646042))
            Line((-0.797464219, 0.063646042), (0.063646042, 0.797464219))
            ThreePointArc((0.063646042, 0.797464219), (2.331261063, 0.616484662), (4.528774303, 0.779366264))
            Line((4.528774303, 0.779366264), (4.709296399, 0))
        make_face()
    extrude(amount=8)
    with BuildSketch(Plane(origin=(97.237587205, 8, 90), x_dir=(1, 0, 0), z_dir=(0, -1, 0))) as redondeo6_piece_4:
        with BuildLine():
            CenterArc((6.832396974, 8), REDONDEO6_R, 202.024312837, 67.975687163)
            Line((-0.583801513, 5), (-1.325421362, 4.7))
            ThreePointArc((-1.325421362, 4.7), (-0.8, 2), (-0.8, 0))
            Line((-0.8, 0), (0, -0.8))
            Line((0, -0.8), (6.832396974, -0.8))
            Line((6.832396974, -0.8), (6.832396974, 0))
        make_face()
    extrude(amount=8)
    # the kernel refuses this fillet: 8 mm, written as the material it takes off along each edge

    # Croquis22 → Cortar-Extruir16 (cut, through all)
    with BuildSketch(Plane(origin=(0, 8, 0), x_dir=(1, 0, 0), z_dir=(0, 1, 0))):
        with Locations(Location((13.703094373, 94.859502658, 0), (0, 0, 270))):
            Circle(CROQUIS22_R)
        with Locations(Location((73.947520586, 94.859502658, 0), (0, 0, 90))):
            Circle(CROQUIS22_R)
        with Locations(Location((73.947520586, -94.859502658, 0), (0, 0, 270))):
            Circle(CROQUIS22_R)
        with Locations(Location((13.703094373, -94.859502658, 0), (0, 0, 90))):
            Circle(CROQUIS22_R)
    extrude(amount=-CORTAR_EXTRUIR16_DEPTH, mode=Mode.SUBTRACT)


solid = part_1.part
